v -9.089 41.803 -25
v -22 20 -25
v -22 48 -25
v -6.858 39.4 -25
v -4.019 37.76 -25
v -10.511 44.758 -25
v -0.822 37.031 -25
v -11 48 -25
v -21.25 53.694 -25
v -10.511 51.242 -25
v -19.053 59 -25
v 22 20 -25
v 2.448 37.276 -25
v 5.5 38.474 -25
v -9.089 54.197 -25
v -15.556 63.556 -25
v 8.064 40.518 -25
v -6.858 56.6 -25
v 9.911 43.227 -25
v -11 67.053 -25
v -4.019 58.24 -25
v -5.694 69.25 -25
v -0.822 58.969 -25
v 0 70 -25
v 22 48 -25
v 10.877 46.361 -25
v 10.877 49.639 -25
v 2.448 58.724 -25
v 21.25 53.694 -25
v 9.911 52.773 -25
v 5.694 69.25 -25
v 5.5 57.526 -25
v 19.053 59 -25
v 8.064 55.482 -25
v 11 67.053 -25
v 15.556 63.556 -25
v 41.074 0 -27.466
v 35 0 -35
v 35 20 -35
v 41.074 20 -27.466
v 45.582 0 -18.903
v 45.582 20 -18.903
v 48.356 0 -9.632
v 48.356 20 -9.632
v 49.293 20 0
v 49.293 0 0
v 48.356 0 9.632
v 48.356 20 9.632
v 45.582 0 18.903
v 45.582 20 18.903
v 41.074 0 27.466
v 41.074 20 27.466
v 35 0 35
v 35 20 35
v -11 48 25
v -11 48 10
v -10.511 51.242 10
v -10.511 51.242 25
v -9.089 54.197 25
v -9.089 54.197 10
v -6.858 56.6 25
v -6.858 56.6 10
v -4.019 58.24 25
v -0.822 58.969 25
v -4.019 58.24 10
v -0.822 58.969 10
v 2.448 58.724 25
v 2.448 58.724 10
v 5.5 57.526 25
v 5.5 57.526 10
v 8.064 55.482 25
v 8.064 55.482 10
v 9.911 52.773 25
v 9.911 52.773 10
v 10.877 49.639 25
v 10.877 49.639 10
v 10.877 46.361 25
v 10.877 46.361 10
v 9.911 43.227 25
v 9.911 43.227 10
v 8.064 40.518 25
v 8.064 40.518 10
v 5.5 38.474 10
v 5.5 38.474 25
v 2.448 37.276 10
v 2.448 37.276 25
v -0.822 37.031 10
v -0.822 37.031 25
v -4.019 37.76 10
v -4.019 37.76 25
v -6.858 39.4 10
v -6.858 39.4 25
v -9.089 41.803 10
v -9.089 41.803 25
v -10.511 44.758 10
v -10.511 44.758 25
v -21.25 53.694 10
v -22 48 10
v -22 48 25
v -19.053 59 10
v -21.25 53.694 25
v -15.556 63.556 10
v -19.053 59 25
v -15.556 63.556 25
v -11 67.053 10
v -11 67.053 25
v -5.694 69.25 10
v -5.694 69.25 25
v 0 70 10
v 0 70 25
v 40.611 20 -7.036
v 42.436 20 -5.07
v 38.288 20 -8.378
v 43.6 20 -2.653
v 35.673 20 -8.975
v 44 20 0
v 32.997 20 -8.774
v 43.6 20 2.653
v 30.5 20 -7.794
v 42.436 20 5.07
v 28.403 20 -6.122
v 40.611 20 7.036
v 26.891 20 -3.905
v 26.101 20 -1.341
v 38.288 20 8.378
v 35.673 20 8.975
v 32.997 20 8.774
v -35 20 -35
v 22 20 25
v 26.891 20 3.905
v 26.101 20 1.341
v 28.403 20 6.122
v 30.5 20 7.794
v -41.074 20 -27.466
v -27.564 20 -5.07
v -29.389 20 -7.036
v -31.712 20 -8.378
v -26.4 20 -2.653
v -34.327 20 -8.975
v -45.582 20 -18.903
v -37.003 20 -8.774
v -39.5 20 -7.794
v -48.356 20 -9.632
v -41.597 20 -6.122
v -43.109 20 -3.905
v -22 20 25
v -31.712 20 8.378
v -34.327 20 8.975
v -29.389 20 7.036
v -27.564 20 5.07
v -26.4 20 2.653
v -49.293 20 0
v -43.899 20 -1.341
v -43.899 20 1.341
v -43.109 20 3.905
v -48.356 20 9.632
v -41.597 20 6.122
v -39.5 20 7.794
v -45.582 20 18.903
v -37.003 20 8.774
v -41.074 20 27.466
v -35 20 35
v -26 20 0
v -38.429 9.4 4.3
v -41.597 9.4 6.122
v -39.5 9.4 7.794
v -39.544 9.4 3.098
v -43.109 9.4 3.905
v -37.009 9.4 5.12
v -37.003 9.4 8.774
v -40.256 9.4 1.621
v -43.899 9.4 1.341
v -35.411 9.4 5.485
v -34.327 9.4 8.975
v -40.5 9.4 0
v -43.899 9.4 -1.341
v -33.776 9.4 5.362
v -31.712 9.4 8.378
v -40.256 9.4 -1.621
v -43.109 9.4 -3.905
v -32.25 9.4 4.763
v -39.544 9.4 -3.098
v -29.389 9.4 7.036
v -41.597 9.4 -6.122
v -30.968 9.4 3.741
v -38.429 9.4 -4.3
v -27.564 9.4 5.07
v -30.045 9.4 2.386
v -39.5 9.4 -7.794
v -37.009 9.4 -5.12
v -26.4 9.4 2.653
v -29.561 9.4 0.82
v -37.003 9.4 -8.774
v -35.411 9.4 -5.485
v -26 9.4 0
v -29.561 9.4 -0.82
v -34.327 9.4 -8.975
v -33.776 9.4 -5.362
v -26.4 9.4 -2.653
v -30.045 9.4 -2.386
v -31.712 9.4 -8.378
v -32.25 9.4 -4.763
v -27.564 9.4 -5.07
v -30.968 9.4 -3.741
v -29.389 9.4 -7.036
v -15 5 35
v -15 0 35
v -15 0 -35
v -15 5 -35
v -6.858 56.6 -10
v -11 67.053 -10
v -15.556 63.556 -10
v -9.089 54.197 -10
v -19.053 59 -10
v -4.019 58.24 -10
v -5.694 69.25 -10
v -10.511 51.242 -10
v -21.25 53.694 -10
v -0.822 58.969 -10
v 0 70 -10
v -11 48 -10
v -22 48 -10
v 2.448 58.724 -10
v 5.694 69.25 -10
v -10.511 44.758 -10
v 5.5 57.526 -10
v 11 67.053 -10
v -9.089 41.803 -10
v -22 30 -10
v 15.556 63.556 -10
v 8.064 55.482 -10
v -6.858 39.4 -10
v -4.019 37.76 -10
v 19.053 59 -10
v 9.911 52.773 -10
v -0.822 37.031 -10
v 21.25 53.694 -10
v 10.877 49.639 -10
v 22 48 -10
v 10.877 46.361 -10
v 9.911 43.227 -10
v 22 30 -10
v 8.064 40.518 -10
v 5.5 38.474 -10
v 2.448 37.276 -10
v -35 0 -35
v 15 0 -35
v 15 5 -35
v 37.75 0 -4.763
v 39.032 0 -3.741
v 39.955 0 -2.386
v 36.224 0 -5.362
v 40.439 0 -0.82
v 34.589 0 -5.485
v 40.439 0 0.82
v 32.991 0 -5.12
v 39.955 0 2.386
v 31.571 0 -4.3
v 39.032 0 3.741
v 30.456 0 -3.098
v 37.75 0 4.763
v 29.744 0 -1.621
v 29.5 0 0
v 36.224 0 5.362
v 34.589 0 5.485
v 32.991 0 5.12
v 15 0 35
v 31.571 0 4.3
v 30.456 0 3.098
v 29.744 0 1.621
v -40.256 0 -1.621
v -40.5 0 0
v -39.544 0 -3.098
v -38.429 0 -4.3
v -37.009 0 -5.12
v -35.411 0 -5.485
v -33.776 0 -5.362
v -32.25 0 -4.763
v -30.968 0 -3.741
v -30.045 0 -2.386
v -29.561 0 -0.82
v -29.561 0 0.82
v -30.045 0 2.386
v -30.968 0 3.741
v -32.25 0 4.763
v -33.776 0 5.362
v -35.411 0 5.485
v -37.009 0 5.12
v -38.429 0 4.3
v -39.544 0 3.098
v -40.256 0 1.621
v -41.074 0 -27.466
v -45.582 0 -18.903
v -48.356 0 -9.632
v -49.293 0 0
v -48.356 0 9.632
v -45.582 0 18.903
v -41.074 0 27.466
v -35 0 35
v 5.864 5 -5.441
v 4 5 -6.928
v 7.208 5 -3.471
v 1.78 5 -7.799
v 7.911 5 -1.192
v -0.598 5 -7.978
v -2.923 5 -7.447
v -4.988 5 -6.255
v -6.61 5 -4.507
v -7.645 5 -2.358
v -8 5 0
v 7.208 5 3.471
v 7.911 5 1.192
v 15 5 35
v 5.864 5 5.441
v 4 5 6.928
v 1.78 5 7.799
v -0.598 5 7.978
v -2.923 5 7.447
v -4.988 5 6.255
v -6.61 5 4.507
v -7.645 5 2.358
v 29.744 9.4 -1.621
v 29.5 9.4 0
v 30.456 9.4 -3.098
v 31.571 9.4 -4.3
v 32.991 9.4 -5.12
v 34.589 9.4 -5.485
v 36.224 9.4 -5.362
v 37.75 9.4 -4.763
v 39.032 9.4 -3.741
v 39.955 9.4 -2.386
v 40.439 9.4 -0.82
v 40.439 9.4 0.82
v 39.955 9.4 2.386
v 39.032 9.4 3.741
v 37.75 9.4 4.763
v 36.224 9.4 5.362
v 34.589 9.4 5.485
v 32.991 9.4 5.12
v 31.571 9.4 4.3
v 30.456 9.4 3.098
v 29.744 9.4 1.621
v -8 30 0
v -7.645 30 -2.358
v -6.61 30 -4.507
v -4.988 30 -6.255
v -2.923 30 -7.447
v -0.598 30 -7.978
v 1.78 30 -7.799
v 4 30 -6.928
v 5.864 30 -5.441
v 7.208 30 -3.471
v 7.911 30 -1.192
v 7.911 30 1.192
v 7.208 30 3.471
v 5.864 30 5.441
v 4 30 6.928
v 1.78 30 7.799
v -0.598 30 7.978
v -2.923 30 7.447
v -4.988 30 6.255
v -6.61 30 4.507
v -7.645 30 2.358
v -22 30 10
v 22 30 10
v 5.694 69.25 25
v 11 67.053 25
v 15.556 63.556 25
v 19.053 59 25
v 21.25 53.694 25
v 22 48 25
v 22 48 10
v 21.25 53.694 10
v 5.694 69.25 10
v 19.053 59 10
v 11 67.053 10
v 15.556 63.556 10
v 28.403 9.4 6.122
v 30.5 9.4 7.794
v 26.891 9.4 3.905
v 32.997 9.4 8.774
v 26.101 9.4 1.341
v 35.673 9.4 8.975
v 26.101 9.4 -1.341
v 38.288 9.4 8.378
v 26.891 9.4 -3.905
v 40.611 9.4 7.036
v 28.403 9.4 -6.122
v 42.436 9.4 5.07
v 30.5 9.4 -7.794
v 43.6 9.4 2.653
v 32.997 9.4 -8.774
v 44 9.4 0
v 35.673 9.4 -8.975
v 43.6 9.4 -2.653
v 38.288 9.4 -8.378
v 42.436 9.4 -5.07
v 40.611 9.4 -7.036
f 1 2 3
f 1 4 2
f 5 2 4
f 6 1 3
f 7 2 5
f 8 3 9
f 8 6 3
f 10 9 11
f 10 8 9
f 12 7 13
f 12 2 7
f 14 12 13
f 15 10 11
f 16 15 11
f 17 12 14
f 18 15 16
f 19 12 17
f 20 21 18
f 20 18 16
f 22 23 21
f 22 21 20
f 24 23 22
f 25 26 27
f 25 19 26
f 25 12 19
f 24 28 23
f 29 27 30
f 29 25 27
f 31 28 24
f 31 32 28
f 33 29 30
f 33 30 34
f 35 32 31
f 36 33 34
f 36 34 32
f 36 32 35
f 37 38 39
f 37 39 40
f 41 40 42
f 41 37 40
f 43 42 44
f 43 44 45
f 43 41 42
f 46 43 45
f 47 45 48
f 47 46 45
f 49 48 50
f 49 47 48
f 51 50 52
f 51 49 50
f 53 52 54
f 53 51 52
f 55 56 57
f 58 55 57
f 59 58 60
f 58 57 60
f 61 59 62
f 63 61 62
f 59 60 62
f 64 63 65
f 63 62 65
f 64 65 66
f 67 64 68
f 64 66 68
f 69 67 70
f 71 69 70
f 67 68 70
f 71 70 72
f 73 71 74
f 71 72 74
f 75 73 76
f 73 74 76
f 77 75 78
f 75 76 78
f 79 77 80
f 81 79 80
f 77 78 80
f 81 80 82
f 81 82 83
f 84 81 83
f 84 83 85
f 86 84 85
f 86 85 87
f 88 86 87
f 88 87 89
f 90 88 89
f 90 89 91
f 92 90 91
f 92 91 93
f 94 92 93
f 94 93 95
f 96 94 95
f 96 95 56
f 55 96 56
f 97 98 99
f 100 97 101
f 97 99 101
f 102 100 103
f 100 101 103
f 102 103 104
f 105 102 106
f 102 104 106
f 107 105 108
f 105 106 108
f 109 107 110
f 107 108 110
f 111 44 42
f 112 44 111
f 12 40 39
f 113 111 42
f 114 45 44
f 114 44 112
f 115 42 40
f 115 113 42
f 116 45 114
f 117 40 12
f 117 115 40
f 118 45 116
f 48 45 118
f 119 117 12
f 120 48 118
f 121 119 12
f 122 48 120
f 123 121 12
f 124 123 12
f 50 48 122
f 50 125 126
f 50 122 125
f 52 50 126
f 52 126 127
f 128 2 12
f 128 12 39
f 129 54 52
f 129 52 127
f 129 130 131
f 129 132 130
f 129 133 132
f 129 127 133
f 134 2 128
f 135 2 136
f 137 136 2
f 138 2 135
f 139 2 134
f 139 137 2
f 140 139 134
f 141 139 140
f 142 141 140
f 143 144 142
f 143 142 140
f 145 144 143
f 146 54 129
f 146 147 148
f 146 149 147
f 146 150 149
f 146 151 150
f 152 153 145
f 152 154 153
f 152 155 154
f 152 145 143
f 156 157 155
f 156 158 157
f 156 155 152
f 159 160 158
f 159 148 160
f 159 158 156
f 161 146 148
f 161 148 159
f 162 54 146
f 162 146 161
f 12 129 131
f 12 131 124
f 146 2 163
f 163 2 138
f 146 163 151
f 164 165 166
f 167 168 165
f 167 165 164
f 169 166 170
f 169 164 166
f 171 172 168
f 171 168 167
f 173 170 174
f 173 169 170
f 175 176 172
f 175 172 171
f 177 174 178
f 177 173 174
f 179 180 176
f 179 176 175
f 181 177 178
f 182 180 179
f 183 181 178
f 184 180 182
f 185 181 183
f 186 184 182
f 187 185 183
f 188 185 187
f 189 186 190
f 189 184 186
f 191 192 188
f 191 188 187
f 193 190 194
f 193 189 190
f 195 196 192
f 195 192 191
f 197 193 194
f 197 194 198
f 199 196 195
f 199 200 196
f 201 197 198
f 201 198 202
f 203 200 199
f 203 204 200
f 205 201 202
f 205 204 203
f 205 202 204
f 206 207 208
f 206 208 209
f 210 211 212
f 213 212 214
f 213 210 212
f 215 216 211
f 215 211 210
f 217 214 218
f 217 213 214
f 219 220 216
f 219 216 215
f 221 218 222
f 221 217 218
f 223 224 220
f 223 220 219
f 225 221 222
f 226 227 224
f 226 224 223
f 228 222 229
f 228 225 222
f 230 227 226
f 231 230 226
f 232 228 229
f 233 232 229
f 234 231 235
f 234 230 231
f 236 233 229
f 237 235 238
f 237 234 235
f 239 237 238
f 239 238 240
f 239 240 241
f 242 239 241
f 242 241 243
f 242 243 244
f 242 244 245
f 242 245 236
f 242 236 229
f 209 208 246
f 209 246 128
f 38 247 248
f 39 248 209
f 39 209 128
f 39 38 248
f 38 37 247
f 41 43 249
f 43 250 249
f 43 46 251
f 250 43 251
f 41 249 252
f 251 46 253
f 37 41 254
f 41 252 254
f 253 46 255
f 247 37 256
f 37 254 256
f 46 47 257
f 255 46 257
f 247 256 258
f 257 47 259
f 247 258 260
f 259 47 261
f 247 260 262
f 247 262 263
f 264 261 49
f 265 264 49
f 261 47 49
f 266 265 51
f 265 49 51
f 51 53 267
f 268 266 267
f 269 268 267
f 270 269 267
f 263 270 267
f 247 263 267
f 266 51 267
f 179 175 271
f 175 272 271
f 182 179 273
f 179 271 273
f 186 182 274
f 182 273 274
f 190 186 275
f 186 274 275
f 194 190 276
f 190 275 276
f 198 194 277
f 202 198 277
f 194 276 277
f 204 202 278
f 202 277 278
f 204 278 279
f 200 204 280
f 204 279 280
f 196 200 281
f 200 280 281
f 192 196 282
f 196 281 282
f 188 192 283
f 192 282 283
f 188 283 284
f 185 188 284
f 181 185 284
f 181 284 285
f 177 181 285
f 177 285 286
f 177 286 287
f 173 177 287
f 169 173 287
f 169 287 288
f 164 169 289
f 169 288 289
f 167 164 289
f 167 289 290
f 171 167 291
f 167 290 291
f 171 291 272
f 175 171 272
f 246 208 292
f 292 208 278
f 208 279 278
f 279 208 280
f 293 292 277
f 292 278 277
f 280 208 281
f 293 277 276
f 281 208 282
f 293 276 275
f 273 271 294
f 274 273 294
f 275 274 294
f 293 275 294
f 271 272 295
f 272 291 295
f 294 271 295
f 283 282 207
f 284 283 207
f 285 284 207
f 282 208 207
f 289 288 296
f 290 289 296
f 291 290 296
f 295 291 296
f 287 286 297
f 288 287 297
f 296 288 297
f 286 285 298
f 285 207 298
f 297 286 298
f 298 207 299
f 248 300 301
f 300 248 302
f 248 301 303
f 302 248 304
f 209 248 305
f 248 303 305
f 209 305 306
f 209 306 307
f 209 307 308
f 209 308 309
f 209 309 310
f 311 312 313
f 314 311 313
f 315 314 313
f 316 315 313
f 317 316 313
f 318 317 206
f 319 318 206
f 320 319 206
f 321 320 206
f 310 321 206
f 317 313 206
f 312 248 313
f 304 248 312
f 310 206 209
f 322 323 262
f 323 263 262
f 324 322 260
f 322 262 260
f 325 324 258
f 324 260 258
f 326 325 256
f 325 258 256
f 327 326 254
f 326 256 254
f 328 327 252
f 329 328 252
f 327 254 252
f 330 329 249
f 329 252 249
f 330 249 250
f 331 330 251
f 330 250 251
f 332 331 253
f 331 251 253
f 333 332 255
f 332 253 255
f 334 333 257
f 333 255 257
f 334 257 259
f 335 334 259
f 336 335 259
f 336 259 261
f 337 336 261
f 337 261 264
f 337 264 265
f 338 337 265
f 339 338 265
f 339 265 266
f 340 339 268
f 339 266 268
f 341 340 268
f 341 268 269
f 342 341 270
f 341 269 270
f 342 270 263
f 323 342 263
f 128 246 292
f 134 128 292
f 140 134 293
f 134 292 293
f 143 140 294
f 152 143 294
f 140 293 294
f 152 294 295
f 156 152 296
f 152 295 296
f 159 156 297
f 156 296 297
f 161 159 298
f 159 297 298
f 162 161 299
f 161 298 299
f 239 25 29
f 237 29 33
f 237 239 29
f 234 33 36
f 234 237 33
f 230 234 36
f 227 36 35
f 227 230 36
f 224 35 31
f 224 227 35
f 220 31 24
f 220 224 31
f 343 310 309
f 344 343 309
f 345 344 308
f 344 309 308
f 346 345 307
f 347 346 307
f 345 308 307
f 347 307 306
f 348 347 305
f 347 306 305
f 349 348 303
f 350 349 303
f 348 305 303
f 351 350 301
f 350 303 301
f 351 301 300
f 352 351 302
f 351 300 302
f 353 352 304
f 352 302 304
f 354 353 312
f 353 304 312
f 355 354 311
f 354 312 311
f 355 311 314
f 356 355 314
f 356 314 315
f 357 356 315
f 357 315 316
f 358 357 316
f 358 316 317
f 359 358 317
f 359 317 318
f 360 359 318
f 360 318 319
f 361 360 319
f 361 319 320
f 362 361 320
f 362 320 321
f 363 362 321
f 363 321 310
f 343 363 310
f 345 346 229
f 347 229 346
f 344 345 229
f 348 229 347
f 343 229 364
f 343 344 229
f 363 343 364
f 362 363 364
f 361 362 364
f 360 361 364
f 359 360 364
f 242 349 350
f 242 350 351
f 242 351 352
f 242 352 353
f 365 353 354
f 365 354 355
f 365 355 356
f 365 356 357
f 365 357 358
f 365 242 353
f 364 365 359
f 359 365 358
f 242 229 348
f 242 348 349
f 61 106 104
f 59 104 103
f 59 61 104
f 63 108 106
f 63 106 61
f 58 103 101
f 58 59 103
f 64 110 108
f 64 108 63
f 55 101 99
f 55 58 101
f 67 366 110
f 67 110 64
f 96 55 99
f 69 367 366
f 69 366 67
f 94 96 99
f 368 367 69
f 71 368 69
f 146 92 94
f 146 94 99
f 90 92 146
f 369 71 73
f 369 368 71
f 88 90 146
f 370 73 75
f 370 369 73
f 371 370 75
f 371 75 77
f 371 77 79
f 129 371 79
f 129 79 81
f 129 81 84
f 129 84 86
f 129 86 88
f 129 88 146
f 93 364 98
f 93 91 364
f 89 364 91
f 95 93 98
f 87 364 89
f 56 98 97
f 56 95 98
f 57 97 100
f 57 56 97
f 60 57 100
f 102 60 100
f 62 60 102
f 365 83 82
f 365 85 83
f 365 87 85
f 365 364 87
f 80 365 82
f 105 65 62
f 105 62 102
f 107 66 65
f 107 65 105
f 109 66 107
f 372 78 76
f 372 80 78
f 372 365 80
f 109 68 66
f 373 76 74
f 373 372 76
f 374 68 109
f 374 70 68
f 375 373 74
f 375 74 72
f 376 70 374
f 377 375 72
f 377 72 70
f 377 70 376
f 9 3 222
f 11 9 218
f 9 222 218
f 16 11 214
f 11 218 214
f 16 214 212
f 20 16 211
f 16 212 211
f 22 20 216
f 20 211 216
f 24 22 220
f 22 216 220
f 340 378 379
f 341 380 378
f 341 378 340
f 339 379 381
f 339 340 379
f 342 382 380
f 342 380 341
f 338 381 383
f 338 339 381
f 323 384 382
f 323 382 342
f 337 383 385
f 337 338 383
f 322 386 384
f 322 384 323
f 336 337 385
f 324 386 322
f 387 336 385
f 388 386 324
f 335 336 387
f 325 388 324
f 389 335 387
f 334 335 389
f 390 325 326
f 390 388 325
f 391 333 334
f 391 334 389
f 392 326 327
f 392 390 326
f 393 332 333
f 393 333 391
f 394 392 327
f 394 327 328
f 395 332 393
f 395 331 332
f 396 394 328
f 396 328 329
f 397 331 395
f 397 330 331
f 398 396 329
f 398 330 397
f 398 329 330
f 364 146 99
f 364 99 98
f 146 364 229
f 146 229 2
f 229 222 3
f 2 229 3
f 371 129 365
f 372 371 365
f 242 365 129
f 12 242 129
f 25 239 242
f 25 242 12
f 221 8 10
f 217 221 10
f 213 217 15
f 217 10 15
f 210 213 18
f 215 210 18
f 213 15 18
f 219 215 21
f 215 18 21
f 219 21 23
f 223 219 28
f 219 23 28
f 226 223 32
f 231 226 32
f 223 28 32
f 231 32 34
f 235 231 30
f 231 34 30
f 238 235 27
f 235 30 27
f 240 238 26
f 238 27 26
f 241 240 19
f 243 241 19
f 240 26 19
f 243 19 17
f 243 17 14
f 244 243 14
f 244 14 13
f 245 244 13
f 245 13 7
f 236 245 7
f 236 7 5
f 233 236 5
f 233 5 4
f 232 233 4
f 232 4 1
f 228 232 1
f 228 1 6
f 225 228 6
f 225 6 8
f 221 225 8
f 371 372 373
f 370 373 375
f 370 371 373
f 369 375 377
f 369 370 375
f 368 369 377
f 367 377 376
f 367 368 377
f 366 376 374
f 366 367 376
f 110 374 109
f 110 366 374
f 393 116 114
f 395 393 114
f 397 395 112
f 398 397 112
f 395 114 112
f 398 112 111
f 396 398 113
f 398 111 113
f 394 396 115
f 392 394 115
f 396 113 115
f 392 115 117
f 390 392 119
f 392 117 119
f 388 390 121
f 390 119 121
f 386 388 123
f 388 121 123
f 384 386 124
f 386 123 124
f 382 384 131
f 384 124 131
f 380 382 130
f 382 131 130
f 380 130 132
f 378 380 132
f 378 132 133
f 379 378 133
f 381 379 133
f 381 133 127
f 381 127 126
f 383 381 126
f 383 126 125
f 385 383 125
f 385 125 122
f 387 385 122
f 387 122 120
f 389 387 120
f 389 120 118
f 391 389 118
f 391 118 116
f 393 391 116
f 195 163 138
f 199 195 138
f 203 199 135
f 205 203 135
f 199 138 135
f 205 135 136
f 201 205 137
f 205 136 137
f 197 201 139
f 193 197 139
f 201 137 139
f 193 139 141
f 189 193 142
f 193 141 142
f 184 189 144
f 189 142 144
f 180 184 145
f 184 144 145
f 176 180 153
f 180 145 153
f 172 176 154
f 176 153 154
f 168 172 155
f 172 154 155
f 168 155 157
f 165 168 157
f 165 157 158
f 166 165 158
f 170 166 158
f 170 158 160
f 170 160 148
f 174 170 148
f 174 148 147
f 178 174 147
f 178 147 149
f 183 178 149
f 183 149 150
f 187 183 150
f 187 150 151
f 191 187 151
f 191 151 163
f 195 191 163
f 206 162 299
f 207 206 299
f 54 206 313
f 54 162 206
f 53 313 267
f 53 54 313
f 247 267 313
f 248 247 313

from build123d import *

# Parameters (mm, degrees)
ESTRUSIONE_ESTRUSIONE1_DEPTH                         = 35
ESTRUSIONE_ESTRUSIONE2_DEPTH                         = 22
ESTRUSIONE_ESTRUSIONE3_DEPTH                         = 20
TAGLIO_ESTRUSIONE1_DEPTH                             = 111.588362117
TAGLIO_ESTRUSIONE1_DEPTH_BACK                        = 111.588362117
SCHIZZO3_W                                           = 30
SCHIZZO3_H                                           = 5
FORO_22_0_22_1_D                                     = 22
FORO_LAMATO_PER_VITE_M10_A_TESTA_CILINDR_D           = 11
FORO_LAMATO_PER_VITE_M10_A_TESTA_CILINDR_CBORE_D     = 18
FORO_LAMATO_PER_VITE_M10_A_TESTA_CILINDR_CBORE_DEPTH = 10.6
FORO_16_0_16_1_D                                     = 16
RACCORDO1_R                                          = 22


with BuildPart() as part:
    # Schizzo1 → Estrusione-Estrusione1 (new, symmetric)
    with BuildSketch(Plane(origin=(0, 0, 0), x_dir=(0, 0, -1), z_dir=(1, 0, 0))):
        Polygon((0, 0), (0, 20), (-25, 20), (-35, 20), (-35, 0), align=None)
        Polygon((25, 20), (0, 20), (0, 0), (35, 0), (35, 20), align=None)
    extrude(amount=ESTRUSIONE_ESTRUSIONE1_DEPTH, both=True)

    # Schizzo1<3> → Estrusione-Estrusione2 (add, symmetric)
    with BuildSketch(Plane(origin=(0, 0, 0), x_dir=(0, 0, -1), z_dir=(1, 0, 0))):
        Polygon((0, 20), (0, 30), (-10, 30), (-10, 70), (-25, 70), (-25, 20), align=None)
        Polygon((10, 30), (0, 30), (0, 20), (25, 20), (25, 70), (10, 70), align=None)
    extrude(amount=ESTRUSIONE_ESTRUSIONE2_DEPTH, both=True)

    # Schizzo2 → Estrusione-Estrusione3 (add)
    with BuildSketch(Plane.XZ):
        with BuildLine():
            Line((-35, 35), (-35, -35))
            ThreePointArc((-35, -35), (-49.292857857, 0), (-35, 35))
        make_face()
        with BuildLine():
            Line((35, 35), (35, -35))
            ThreePointArc((35, -35), (49.292857857, 0), (35, 35))
        make_face()
    extrude(amount=-ESTRUSIONE_ESTRUSIONE3_DEPTH)

    # Schizzo3 → Taglio-Estrusione1 (cut, two sides: drawn at the far end of the back side and taken through both)
    with BuildSketch(Plane(origin=(0, 0, -35), x_dir=(-1, 0, 0), z_dir=(0, 0, -1)).offset(-TAGLIO_ESTRUSIONE1_DEPTH_BACK)):
        with Locations((0, 2.5)):
            Rectangle(SCHIZZO3_W, SCHIZZO3_H)
    extrude(amount=TAGLIO_ESTRUSIONE1_DEPTH + TAGLIO_ESTRUSIONE1_DEPTH_BACK, mode=Mode.SUBTRACT)

    # Foro Ø22.0 (22)-1 (through all)
    with Locations(Plane.XY.offset(25)):
        with Locations((0, 48)):
            Hole(FORO_22_0_22_1_D / 2)

    # Foro lamato per Vite M10 a testa cilindrica-1 (through all)
    with Locations(Plane(origin=(0, 20, 0), x_dir=(1, 0, 0), z_dir=(0, 1, 0))):
        with Locations((35, 0), (-35, 0)):
            CounterBoreHole(FORO_LAMATO_PER_VITE_M10_A_TESTA_CILINDR_D / 2, FORO_LAMATO_PER_VITE_M10_A_TESTA_CILINDR_CBORE_D / 2, FORO_LAMATO_PER_VITE_M10_A_TESTA_CILINDR_CBORE_DEPTH)

    # Foro Ø16.0 (16)-1 (through all)
    with Locations(Plane(origin=(0, 30, 0), x_dir=(1, 0, 0), z_dir=(0, 1, 0))):
        with Locations((0, 0)):
            Hole(FORO_16_0_16_1_D / 2)

    # Raccordo1
    raccordo1_edges = [part.edges().sort_by_distance(p)[0] for p in [
        (-22, 70, 17.5),
        (22, 70, 17.5),
        (-22, 70, -17.5),
        (22, 70, -17.5),
    ]]
    fillet(raccordo1_edges, radius=RACCORDO1_R - 0.0001)  # a hair under: the kernel refuses the full size


solid = part.part
